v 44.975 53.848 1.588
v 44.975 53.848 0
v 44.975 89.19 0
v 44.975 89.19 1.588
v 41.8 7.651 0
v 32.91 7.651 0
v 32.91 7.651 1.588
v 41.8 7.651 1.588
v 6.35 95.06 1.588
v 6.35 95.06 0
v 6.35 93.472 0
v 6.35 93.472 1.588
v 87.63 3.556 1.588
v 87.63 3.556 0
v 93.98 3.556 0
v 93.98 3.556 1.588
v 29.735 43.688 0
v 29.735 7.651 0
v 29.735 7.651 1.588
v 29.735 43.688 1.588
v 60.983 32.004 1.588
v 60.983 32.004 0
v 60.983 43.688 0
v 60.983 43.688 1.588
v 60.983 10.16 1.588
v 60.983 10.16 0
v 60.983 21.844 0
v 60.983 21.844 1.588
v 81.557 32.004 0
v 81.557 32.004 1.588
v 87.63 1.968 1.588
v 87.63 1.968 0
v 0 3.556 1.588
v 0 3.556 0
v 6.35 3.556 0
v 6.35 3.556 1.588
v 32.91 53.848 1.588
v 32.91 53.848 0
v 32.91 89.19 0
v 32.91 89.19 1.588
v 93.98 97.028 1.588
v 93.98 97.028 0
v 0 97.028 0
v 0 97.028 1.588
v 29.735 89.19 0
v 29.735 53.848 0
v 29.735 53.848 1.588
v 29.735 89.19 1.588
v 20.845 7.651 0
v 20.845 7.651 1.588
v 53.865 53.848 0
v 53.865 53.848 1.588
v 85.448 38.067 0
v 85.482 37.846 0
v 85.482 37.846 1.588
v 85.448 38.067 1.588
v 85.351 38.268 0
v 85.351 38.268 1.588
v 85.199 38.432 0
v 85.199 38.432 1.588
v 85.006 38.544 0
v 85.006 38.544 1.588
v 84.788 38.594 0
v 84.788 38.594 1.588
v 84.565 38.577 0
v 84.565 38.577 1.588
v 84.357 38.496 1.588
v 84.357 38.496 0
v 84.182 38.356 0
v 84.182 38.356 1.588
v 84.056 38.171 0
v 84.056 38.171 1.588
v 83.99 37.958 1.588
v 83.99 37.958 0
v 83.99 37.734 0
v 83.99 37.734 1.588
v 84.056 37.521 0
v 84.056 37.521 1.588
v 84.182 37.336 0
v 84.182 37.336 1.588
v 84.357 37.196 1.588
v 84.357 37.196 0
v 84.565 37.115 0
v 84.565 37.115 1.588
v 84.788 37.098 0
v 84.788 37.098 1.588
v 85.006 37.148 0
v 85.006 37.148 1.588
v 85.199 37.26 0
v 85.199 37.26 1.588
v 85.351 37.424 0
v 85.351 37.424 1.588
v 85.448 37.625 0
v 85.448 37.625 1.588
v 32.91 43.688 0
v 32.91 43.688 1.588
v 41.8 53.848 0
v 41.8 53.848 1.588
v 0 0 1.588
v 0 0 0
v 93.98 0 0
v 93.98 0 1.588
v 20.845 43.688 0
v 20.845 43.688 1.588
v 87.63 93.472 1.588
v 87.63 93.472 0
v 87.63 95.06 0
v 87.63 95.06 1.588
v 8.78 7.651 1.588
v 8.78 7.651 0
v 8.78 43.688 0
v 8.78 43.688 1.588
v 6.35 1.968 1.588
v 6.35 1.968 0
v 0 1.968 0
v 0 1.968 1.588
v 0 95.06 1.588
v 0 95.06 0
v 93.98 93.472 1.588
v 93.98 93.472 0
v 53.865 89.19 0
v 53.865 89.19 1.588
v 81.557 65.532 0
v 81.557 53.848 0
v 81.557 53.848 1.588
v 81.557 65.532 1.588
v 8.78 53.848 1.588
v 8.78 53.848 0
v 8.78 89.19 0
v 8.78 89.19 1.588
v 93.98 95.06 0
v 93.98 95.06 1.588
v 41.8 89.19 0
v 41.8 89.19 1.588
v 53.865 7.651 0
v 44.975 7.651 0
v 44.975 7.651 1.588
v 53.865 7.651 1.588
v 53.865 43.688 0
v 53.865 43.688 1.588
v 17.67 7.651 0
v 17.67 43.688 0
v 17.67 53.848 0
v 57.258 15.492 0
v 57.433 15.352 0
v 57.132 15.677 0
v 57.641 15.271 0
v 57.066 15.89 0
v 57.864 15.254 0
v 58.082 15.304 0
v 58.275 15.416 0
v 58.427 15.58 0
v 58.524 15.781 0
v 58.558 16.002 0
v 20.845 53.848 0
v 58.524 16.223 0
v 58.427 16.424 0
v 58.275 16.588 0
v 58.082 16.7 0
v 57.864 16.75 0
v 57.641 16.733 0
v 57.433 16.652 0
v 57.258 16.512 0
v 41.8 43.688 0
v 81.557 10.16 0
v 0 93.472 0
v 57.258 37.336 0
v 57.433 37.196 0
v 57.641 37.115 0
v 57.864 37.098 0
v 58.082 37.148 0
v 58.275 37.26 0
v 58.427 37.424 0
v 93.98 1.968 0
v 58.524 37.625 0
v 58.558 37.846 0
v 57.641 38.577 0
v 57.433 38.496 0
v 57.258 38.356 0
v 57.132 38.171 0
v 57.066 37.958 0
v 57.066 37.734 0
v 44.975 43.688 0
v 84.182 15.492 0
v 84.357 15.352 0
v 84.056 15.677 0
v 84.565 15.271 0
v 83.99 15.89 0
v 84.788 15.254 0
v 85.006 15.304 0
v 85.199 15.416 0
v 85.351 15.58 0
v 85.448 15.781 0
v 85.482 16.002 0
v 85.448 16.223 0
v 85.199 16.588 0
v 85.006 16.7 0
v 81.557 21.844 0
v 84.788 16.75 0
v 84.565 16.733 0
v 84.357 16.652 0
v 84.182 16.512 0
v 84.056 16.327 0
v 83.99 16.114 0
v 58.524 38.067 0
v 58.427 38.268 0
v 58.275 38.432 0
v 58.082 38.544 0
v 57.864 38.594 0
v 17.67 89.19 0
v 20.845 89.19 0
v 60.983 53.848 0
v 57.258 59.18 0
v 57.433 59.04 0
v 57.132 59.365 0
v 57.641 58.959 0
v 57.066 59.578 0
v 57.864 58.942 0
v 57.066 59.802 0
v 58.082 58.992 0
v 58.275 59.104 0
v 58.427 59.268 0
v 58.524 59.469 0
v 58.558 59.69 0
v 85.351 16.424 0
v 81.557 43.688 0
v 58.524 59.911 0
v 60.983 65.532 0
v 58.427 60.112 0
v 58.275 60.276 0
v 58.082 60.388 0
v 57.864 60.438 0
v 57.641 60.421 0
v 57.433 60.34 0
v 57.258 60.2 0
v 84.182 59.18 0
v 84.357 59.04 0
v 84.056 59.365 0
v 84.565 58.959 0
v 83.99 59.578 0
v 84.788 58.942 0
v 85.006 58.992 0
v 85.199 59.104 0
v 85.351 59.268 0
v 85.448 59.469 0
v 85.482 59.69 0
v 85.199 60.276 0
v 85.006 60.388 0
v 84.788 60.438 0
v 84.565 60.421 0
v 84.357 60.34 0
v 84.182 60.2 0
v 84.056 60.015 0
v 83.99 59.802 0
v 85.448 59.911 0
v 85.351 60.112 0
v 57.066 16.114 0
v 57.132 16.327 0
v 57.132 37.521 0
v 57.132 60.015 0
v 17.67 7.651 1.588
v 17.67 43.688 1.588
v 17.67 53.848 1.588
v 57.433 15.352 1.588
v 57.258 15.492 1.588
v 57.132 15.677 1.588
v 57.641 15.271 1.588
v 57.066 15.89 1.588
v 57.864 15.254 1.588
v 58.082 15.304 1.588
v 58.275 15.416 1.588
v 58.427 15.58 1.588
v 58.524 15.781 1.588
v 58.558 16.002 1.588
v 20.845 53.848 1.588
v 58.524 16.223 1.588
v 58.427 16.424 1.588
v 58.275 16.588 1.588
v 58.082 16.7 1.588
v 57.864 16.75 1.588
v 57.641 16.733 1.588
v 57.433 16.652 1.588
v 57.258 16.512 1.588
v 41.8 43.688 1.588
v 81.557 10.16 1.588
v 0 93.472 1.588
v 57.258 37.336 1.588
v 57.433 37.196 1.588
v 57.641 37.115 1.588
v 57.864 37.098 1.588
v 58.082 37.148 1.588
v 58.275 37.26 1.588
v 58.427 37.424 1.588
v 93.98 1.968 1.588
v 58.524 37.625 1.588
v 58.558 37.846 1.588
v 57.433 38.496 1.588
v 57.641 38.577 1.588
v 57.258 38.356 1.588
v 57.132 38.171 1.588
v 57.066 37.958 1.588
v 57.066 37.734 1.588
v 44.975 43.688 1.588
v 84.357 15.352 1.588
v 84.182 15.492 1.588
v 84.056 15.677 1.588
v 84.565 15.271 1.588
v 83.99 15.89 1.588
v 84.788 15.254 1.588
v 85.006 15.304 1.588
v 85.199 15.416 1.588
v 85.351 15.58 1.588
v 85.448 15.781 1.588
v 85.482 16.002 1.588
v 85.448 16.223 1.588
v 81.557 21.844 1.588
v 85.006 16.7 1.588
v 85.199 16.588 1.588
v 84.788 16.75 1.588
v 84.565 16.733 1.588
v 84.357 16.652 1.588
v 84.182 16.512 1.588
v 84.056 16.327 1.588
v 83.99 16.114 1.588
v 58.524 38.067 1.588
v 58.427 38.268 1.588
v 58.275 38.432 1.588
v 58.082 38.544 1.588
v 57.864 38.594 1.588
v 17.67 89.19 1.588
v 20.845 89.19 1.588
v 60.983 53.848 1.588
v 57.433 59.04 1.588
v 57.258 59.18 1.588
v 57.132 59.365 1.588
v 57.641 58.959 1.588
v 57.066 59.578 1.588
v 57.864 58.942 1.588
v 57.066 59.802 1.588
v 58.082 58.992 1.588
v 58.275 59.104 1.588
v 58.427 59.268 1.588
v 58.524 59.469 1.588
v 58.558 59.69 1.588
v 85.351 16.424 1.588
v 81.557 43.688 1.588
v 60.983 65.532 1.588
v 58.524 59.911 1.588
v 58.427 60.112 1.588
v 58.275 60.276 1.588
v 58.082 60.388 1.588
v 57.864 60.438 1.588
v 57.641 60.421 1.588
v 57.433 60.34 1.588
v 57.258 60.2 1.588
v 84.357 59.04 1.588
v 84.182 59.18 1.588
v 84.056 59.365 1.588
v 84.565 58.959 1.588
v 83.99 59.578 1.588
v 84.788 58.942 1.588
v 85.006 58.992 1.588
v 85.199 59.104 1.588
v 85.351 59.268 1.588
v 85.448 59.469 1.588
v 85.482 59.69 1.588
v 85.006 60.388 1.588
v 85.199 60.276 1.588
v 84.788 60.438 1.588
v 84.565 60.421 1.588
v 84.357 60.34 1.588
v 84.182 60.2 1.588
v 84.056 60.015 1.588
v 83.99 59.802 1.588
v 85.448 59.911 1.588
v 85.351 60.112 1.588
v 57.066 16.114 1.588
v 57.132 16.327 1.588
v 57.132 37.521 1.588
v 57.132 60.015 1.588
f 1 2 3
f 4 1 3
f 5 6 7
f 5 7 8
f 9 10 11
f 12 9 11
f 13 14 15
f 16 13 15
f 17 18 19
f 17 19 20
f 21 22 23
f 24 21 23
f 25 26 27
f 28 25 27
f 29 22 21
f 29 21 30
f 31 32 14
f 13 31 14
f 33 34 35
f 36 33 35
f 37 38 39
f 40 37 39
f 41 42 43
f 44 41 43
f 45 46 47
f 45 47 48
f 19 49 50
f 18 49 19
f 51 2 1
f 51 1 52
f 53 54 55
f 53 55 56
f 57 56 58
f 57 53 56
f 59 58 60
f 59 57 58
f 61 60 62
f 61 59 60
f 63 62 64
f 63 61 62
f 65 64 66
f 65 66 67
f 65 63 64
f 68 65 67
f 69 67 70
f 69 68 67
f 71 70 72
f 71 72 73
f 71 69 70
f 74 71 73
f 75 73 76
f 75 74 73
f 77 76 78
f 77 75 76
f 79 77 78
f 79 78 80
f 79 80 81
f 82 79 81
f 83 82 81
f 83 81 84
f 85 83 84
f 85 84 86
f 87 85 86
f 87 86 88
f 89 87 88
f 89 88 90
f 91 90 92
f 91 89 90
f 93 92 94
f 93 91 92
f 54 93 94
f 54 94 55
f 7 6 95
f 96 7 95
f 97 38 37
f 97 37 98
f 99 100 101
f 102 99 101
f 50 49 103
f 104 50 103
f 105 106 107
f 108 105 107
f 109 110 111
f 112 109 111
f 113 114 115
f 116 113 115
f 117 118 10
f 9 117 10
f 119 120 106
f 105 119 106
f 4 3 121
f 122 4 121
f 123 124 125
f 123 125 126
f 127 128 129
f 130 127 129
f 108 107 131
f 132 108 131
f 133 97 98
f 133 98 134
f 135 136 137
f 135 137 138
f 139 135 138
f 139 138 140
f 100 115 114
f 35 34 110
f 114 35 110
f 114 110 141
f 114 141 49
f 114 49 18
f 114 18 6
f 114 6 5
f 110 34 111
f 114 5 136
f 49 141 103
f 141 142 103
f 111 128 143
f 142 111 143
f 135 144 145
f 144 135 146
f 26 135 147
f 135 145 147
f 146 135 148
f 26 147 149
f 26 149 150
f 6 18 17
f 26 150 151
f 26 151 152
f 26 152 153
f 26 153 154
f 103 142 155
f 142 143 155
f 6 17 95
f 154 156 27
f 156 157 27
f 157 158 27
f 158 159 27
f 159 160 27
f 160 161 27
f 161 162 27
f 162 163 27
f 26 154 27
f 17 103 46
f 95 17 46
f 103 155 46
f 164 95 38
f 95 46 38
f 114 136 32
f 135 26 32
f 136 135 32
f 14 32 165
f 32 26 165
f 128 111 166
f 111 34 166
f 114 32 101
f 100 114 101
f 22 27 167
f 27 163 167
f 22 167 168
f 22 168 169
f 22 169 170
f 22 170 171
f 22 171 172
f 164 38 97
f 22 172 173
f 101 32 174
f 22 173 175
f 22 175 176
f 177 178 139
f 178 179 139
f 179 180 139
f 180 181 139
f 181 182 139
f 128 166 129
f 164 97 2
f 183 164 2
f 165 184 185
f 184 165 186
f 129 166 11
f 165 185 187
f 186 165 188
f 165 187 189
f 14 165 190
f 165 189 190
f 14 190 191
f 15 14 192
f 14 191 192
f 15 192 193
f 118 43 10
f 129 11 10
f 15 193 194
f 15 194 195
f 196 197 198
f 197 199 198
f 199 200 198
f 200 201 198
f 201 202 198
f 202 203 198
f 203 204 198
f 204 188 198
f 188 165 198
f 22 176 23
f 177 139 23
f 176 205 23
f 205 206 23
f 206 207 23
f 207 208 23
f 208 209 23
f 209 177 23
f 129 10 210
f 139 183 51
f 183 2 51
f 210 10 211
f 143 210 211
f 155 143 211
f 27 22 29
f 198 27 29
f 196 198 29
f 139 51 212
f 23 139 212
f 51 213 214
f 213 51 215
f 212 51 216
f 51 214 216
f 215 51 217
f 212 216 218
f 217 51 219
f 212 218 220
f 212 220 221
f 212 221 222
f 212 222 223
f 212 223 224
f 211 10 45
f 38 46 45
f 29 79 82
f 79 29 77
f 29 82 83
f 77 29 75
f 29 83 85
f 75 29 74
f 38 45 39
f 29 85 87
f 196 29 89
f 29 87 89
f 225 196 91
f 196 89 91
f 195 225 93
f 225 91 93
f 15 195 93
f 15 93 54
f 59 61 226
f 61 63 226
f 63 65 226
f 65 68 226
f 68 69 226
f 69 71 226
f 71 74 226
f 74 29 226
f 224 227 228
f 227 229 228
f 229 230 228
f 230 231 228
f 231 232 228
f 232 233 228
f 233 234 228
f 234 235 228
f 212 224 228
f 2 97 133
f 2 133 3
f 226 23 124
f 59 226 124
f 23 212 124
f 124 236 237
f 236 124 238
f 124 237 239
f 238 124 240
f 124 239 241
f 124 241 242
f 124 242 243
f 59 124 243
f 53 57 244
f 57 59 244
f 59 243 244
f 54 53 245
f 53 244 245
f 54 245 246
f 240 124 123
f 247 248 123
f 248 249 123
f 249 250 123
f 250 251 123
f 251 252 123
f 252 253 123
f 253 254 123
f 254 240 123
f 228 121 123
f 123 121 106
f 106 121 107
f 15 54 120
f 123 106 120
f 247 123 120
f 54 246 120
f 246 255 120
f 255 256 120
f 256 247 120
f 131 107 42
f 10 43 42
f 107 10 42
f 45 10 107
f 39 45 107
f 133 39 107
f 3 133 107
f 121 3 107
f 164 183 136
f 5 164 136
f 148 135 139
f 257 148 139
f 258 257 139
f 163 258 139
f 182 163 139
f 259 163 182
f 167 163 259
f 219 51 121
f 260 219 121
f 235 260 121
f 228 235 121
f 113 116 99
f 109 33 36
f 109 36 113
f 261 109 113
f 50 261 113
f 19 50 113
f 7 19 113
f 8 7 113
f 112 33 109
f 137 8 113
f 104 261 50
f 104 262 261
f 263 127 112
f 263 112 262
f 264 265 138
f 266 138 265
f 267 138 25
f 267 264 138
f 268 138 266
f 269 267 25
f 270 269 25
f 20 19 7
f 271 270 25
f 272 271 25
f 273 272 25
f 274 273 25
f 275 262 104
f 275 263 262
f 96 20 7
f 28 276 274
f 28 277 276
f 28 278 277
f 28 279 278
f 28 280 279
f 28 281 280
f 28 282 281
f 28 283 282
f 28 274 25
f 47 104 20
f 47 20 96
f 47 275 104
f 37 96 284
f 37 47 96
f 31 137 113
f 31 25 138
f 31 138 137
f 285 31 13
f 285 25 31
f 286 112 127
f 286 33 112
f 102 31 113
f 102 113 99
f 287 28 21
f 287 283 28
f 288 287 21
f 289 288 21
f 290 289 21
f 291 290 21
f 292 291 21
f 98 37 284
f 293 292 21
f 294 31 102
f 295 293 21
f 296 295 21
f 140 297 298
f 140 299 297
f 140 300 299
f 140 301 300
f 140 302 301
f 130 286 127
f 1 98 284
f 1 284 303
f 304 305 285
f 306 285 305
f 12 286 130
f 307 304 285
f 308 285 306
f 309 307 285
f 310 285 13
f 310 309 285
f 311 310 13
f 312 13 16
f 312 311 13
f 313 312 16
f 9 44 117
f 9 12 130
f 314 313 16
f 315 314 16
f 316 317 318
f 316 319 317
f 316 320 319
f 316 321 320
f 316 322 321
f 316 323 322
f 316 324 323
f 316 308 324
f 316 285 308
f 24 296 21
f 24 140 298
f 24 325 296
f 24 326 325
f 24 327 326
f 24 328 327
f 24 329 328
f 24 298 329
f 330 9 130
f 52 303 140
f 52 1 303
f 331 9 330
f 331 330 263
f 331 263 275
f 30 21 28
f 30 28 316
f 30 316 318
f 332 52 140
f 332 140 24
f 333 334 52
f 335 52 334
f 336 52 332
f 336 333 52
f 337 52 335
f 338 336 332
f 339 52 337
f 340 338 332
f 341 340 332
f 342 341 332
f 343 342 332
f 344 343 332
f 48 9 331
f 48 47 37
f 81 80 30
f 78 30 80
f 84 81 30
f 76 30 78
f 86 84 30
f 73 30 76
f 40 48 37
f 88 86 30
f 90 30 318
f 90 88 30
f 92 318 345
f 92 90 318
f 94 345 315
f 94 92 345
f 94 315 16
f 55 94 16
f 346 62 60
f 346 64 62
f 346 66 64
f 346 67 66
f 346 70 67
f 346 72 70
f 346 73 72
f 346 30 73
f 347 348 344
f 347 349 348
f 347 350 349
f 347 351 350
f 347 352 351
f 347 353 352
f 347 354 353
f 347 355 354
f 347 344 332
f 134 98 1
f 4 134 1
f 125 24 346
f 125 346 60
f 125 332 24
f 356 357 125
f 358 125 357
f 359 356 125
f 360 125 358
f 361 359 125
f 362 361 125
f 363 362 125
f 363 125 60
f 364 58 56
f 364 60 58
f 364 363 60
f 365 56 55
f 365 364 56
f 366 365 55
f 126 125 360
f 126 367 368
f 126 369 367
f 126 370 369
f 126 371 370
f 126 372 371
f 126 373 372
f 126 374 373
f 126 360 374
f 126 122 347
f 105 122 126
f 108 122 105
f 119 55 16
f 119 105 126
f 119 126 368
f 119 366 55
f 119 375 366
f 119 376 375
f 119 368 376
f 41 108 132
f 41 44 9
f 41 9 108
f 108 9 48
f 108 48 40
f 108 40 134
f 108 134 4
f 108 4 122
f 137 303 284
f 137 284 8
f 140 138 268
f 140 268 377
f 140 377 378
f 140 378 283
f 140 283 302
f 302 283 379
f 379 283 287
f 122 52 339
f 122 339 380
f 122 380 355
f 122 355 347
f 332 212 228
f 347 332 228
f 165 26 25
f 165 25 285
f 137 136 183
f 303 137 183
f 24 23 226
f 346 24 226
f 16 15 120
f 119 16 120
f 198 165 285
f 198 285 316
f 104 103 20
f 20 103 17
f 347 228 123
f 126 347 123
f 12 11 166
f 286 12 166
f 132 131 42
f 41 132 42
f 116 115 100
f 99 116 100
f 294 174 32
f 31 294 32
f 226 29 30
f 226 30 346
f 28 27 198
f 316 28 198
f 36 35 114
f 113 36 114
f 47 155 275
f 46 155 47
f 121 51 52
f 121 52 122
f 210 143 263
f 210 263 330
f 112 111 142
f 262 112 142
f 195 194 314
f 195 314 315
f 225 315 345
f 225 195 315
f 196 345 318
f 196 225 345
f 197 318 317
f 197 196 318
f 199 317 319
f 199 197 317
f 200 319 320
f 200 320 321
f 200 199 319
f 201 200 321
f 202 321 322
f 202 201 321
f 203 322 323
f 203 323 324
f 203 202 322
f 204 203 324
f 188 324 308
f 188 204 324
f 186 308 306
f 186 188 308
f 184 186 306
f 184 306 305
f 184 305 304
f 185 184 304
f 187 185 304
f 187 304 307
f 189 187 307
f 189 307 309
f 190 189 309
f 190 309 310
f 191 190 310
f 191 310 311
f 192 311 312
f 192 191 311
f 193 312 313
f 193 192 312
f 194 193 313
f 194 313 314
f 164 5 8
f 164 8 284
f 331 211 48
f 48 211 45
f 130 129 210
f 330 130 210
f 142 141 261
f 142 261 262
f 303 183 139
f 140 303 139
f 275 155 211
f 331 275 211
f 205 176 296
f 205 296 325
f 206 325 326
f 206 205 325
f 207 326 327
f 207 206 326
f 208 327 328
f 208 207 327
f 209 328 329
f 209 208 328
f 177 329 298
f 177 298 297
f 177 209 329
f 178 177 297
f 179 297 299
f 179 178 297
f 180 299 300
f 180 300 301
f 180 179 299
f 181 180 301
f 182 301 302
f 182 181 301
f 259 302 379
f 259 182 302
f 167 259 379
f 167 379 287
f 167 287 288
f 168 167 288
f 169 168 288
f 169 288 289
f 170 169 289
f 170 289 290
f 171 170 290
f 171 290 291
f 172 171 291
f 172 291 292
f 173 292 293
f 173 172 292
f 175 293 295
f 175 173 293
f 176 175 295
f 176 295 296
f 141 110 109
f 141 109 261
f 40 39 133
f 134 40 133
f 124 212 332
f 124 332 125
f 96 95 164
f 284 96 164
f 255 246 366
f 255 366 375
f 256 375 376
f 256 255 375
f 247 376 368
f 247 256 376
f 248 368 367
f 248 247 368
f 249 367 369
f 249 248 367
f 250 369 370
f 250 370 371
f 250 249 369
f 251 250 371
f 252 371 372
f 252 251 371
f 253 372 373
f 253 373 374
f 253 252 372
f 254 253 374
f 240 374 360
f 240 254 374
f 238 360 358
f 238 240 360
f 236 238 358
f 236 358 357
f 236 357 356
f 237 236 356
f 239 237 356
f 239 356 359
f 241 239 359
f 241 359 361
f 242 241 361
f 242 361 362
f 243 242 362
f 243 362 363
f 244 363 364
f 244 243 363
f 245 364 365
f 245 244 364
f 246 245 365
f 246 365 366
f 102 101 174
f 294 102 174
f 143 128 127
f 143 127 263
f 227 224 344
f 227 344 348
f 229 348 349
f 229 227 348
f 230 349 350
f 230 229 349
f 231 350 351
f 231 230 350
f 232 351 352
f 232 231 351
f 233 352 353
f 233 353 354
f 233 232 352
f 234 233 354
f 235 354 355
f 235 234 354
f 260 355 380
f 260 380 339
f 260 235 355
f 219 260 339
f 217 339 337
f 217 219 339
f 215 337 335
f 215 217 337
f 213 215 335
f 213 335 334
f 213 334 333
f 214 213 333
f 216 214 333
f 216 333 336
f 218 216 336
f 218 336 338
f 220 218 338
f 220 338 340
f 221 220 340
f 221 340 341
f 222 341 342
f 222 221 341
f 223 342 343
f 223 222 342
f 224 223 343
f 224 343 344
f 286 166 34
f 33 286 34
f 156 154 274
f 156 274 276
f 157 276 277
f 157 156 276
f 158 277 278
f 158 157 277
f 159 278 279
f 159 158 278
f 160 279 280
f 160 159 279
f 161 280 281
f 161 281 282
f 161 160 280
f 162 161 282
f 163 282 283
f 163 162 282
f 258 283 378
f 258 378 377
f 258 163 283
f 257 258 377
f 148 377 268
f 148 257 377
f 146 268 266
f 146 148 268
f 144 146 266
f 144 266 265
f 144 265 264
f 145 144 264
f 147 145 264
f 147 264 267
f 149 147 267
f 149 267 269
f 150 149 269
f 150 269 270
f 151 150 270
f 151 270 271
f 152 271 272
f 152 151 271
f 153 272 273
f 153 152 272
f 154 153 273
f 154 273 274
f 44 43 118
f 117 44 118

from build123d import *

# Parameters (mm, degrees)
SKETCH1_R           = 0.75
SKETCH1_W           = 20.574
SKETCH1_H           = 11.684
SKETCH1_W_2         = 8.89
SKETCH1_H_2         = 35.341542764
SKETCH1_H_3         = 36.036734061
BOSS_EXTRUDE1_DEPTH = 1.5875


with BuildPart() as part:
    # Sketch1 → Boss-Extrude1 (new body)
    with BuildSketch(Plane.XY):
        Polygon((0, 0), (93.98, 0), (93.98, 1.9685), (87.63, 1.9685), (87.63, 3.556), (93.98, 3.556), (93.98, 93.472), (87.63, 93.472), (87.63, 95.0595), (93.98, 95.0595), (93.98, 97.028), (0, 97.028), (0, 95.0595), (6.35, 95.0595), (6.35, 93.472), (0, 93.472), (0, 3.556), (6.35, 3.556), (6.35, 1.9685), (0, 1.9685), align=None)
        with Locations((57.807600894, 16.002)):
            Circle(SKETCH1_R, mode=Mode.SUBTRACT)
        with Locations((84.731600894, 16.002)):
            Circle(SKETCH1_R, mode=Mode.SUBTRACT)
        with Locations((57.807600894, 37.846)):
            Circle(SKETCH1_R, mode=Mode.SUBTRACT)
        with Locations((84.731600894, 37.846)):
            Circle(SKETCH1_R, mode=Mode.SUBTRACT)
        with Locations((57.807600894, 59.69)):
            Circle(SKETCH1_R, mode=Mode.SUBTRACT)
        with Locations((84.731600894, 59.69)):
            Circle(SKETCH1_R, mode=Mode.SUBTRACT)
        with Locations((71.269600894, 16.002)):
            Rectangle(SKETCH1_W, SKETCH1_H, mode=Mode.SUBTRACT)
        with Locations((71.269600894, 37.846)):
            Rectangle(SKETCH1_W, SKETCH1_H, mode=Mode.SUBTRACT)
        with Locations((71.269600894, 59.69)):
            Rectangle(SKETCH1_W, SKETCH1_H, mode=Mode.SUBTRACT)
        with Locations((25.290486919, 71.518771382)):
            Rectangle(SKETCH1_W_2, SKETCH1_H_2, mode=Mode.SUBTRACT)
        with Locations((13.225486919, 71.518771382)):
            Rectangle(SKETCH1_W_2, SKETCH1_H_2, mode=Mode.SUBTRACT)
        with Locations((13.225486919, 25.66963297)):
            Rectangle(SKETCH1_W_2, SKETCH1_H_3, mode=Mode.SUBTRACT)
        with Locations((25.290486919, 25.66963297)):
            Rectangle(SKETCH1_W_2, SKETCH1_H_3, mode=Mode.SUBTRACT)
        with Locations((37.355486919, 71.518771382)):
            Rectangle(SKETCH1_W_2, SKETCH1_H_2, mode=Mode.SUBTRACT)
        with Locations((37.355486919, 25.66963297)):
            Rectangle(SKETCH1_W_2, SKETCH1_H_3, mode=Mode.SUBTRACT)
        with Locations((49.420486919, 71.518771382)):
            Rectangle(SKETCH1_W_2, SKETCH1_H_2, mode=Mode.SUBTRACT)
        with Locations((49.420486919, 25.66963297)):
            Rectangle(SKETCH1_W_2, SKETCH1_H_3, mode=Mode.SUBTRACT)
    extrude(amount=BOSS_EXTRUDE1_DEPTH)


solid = part.part
